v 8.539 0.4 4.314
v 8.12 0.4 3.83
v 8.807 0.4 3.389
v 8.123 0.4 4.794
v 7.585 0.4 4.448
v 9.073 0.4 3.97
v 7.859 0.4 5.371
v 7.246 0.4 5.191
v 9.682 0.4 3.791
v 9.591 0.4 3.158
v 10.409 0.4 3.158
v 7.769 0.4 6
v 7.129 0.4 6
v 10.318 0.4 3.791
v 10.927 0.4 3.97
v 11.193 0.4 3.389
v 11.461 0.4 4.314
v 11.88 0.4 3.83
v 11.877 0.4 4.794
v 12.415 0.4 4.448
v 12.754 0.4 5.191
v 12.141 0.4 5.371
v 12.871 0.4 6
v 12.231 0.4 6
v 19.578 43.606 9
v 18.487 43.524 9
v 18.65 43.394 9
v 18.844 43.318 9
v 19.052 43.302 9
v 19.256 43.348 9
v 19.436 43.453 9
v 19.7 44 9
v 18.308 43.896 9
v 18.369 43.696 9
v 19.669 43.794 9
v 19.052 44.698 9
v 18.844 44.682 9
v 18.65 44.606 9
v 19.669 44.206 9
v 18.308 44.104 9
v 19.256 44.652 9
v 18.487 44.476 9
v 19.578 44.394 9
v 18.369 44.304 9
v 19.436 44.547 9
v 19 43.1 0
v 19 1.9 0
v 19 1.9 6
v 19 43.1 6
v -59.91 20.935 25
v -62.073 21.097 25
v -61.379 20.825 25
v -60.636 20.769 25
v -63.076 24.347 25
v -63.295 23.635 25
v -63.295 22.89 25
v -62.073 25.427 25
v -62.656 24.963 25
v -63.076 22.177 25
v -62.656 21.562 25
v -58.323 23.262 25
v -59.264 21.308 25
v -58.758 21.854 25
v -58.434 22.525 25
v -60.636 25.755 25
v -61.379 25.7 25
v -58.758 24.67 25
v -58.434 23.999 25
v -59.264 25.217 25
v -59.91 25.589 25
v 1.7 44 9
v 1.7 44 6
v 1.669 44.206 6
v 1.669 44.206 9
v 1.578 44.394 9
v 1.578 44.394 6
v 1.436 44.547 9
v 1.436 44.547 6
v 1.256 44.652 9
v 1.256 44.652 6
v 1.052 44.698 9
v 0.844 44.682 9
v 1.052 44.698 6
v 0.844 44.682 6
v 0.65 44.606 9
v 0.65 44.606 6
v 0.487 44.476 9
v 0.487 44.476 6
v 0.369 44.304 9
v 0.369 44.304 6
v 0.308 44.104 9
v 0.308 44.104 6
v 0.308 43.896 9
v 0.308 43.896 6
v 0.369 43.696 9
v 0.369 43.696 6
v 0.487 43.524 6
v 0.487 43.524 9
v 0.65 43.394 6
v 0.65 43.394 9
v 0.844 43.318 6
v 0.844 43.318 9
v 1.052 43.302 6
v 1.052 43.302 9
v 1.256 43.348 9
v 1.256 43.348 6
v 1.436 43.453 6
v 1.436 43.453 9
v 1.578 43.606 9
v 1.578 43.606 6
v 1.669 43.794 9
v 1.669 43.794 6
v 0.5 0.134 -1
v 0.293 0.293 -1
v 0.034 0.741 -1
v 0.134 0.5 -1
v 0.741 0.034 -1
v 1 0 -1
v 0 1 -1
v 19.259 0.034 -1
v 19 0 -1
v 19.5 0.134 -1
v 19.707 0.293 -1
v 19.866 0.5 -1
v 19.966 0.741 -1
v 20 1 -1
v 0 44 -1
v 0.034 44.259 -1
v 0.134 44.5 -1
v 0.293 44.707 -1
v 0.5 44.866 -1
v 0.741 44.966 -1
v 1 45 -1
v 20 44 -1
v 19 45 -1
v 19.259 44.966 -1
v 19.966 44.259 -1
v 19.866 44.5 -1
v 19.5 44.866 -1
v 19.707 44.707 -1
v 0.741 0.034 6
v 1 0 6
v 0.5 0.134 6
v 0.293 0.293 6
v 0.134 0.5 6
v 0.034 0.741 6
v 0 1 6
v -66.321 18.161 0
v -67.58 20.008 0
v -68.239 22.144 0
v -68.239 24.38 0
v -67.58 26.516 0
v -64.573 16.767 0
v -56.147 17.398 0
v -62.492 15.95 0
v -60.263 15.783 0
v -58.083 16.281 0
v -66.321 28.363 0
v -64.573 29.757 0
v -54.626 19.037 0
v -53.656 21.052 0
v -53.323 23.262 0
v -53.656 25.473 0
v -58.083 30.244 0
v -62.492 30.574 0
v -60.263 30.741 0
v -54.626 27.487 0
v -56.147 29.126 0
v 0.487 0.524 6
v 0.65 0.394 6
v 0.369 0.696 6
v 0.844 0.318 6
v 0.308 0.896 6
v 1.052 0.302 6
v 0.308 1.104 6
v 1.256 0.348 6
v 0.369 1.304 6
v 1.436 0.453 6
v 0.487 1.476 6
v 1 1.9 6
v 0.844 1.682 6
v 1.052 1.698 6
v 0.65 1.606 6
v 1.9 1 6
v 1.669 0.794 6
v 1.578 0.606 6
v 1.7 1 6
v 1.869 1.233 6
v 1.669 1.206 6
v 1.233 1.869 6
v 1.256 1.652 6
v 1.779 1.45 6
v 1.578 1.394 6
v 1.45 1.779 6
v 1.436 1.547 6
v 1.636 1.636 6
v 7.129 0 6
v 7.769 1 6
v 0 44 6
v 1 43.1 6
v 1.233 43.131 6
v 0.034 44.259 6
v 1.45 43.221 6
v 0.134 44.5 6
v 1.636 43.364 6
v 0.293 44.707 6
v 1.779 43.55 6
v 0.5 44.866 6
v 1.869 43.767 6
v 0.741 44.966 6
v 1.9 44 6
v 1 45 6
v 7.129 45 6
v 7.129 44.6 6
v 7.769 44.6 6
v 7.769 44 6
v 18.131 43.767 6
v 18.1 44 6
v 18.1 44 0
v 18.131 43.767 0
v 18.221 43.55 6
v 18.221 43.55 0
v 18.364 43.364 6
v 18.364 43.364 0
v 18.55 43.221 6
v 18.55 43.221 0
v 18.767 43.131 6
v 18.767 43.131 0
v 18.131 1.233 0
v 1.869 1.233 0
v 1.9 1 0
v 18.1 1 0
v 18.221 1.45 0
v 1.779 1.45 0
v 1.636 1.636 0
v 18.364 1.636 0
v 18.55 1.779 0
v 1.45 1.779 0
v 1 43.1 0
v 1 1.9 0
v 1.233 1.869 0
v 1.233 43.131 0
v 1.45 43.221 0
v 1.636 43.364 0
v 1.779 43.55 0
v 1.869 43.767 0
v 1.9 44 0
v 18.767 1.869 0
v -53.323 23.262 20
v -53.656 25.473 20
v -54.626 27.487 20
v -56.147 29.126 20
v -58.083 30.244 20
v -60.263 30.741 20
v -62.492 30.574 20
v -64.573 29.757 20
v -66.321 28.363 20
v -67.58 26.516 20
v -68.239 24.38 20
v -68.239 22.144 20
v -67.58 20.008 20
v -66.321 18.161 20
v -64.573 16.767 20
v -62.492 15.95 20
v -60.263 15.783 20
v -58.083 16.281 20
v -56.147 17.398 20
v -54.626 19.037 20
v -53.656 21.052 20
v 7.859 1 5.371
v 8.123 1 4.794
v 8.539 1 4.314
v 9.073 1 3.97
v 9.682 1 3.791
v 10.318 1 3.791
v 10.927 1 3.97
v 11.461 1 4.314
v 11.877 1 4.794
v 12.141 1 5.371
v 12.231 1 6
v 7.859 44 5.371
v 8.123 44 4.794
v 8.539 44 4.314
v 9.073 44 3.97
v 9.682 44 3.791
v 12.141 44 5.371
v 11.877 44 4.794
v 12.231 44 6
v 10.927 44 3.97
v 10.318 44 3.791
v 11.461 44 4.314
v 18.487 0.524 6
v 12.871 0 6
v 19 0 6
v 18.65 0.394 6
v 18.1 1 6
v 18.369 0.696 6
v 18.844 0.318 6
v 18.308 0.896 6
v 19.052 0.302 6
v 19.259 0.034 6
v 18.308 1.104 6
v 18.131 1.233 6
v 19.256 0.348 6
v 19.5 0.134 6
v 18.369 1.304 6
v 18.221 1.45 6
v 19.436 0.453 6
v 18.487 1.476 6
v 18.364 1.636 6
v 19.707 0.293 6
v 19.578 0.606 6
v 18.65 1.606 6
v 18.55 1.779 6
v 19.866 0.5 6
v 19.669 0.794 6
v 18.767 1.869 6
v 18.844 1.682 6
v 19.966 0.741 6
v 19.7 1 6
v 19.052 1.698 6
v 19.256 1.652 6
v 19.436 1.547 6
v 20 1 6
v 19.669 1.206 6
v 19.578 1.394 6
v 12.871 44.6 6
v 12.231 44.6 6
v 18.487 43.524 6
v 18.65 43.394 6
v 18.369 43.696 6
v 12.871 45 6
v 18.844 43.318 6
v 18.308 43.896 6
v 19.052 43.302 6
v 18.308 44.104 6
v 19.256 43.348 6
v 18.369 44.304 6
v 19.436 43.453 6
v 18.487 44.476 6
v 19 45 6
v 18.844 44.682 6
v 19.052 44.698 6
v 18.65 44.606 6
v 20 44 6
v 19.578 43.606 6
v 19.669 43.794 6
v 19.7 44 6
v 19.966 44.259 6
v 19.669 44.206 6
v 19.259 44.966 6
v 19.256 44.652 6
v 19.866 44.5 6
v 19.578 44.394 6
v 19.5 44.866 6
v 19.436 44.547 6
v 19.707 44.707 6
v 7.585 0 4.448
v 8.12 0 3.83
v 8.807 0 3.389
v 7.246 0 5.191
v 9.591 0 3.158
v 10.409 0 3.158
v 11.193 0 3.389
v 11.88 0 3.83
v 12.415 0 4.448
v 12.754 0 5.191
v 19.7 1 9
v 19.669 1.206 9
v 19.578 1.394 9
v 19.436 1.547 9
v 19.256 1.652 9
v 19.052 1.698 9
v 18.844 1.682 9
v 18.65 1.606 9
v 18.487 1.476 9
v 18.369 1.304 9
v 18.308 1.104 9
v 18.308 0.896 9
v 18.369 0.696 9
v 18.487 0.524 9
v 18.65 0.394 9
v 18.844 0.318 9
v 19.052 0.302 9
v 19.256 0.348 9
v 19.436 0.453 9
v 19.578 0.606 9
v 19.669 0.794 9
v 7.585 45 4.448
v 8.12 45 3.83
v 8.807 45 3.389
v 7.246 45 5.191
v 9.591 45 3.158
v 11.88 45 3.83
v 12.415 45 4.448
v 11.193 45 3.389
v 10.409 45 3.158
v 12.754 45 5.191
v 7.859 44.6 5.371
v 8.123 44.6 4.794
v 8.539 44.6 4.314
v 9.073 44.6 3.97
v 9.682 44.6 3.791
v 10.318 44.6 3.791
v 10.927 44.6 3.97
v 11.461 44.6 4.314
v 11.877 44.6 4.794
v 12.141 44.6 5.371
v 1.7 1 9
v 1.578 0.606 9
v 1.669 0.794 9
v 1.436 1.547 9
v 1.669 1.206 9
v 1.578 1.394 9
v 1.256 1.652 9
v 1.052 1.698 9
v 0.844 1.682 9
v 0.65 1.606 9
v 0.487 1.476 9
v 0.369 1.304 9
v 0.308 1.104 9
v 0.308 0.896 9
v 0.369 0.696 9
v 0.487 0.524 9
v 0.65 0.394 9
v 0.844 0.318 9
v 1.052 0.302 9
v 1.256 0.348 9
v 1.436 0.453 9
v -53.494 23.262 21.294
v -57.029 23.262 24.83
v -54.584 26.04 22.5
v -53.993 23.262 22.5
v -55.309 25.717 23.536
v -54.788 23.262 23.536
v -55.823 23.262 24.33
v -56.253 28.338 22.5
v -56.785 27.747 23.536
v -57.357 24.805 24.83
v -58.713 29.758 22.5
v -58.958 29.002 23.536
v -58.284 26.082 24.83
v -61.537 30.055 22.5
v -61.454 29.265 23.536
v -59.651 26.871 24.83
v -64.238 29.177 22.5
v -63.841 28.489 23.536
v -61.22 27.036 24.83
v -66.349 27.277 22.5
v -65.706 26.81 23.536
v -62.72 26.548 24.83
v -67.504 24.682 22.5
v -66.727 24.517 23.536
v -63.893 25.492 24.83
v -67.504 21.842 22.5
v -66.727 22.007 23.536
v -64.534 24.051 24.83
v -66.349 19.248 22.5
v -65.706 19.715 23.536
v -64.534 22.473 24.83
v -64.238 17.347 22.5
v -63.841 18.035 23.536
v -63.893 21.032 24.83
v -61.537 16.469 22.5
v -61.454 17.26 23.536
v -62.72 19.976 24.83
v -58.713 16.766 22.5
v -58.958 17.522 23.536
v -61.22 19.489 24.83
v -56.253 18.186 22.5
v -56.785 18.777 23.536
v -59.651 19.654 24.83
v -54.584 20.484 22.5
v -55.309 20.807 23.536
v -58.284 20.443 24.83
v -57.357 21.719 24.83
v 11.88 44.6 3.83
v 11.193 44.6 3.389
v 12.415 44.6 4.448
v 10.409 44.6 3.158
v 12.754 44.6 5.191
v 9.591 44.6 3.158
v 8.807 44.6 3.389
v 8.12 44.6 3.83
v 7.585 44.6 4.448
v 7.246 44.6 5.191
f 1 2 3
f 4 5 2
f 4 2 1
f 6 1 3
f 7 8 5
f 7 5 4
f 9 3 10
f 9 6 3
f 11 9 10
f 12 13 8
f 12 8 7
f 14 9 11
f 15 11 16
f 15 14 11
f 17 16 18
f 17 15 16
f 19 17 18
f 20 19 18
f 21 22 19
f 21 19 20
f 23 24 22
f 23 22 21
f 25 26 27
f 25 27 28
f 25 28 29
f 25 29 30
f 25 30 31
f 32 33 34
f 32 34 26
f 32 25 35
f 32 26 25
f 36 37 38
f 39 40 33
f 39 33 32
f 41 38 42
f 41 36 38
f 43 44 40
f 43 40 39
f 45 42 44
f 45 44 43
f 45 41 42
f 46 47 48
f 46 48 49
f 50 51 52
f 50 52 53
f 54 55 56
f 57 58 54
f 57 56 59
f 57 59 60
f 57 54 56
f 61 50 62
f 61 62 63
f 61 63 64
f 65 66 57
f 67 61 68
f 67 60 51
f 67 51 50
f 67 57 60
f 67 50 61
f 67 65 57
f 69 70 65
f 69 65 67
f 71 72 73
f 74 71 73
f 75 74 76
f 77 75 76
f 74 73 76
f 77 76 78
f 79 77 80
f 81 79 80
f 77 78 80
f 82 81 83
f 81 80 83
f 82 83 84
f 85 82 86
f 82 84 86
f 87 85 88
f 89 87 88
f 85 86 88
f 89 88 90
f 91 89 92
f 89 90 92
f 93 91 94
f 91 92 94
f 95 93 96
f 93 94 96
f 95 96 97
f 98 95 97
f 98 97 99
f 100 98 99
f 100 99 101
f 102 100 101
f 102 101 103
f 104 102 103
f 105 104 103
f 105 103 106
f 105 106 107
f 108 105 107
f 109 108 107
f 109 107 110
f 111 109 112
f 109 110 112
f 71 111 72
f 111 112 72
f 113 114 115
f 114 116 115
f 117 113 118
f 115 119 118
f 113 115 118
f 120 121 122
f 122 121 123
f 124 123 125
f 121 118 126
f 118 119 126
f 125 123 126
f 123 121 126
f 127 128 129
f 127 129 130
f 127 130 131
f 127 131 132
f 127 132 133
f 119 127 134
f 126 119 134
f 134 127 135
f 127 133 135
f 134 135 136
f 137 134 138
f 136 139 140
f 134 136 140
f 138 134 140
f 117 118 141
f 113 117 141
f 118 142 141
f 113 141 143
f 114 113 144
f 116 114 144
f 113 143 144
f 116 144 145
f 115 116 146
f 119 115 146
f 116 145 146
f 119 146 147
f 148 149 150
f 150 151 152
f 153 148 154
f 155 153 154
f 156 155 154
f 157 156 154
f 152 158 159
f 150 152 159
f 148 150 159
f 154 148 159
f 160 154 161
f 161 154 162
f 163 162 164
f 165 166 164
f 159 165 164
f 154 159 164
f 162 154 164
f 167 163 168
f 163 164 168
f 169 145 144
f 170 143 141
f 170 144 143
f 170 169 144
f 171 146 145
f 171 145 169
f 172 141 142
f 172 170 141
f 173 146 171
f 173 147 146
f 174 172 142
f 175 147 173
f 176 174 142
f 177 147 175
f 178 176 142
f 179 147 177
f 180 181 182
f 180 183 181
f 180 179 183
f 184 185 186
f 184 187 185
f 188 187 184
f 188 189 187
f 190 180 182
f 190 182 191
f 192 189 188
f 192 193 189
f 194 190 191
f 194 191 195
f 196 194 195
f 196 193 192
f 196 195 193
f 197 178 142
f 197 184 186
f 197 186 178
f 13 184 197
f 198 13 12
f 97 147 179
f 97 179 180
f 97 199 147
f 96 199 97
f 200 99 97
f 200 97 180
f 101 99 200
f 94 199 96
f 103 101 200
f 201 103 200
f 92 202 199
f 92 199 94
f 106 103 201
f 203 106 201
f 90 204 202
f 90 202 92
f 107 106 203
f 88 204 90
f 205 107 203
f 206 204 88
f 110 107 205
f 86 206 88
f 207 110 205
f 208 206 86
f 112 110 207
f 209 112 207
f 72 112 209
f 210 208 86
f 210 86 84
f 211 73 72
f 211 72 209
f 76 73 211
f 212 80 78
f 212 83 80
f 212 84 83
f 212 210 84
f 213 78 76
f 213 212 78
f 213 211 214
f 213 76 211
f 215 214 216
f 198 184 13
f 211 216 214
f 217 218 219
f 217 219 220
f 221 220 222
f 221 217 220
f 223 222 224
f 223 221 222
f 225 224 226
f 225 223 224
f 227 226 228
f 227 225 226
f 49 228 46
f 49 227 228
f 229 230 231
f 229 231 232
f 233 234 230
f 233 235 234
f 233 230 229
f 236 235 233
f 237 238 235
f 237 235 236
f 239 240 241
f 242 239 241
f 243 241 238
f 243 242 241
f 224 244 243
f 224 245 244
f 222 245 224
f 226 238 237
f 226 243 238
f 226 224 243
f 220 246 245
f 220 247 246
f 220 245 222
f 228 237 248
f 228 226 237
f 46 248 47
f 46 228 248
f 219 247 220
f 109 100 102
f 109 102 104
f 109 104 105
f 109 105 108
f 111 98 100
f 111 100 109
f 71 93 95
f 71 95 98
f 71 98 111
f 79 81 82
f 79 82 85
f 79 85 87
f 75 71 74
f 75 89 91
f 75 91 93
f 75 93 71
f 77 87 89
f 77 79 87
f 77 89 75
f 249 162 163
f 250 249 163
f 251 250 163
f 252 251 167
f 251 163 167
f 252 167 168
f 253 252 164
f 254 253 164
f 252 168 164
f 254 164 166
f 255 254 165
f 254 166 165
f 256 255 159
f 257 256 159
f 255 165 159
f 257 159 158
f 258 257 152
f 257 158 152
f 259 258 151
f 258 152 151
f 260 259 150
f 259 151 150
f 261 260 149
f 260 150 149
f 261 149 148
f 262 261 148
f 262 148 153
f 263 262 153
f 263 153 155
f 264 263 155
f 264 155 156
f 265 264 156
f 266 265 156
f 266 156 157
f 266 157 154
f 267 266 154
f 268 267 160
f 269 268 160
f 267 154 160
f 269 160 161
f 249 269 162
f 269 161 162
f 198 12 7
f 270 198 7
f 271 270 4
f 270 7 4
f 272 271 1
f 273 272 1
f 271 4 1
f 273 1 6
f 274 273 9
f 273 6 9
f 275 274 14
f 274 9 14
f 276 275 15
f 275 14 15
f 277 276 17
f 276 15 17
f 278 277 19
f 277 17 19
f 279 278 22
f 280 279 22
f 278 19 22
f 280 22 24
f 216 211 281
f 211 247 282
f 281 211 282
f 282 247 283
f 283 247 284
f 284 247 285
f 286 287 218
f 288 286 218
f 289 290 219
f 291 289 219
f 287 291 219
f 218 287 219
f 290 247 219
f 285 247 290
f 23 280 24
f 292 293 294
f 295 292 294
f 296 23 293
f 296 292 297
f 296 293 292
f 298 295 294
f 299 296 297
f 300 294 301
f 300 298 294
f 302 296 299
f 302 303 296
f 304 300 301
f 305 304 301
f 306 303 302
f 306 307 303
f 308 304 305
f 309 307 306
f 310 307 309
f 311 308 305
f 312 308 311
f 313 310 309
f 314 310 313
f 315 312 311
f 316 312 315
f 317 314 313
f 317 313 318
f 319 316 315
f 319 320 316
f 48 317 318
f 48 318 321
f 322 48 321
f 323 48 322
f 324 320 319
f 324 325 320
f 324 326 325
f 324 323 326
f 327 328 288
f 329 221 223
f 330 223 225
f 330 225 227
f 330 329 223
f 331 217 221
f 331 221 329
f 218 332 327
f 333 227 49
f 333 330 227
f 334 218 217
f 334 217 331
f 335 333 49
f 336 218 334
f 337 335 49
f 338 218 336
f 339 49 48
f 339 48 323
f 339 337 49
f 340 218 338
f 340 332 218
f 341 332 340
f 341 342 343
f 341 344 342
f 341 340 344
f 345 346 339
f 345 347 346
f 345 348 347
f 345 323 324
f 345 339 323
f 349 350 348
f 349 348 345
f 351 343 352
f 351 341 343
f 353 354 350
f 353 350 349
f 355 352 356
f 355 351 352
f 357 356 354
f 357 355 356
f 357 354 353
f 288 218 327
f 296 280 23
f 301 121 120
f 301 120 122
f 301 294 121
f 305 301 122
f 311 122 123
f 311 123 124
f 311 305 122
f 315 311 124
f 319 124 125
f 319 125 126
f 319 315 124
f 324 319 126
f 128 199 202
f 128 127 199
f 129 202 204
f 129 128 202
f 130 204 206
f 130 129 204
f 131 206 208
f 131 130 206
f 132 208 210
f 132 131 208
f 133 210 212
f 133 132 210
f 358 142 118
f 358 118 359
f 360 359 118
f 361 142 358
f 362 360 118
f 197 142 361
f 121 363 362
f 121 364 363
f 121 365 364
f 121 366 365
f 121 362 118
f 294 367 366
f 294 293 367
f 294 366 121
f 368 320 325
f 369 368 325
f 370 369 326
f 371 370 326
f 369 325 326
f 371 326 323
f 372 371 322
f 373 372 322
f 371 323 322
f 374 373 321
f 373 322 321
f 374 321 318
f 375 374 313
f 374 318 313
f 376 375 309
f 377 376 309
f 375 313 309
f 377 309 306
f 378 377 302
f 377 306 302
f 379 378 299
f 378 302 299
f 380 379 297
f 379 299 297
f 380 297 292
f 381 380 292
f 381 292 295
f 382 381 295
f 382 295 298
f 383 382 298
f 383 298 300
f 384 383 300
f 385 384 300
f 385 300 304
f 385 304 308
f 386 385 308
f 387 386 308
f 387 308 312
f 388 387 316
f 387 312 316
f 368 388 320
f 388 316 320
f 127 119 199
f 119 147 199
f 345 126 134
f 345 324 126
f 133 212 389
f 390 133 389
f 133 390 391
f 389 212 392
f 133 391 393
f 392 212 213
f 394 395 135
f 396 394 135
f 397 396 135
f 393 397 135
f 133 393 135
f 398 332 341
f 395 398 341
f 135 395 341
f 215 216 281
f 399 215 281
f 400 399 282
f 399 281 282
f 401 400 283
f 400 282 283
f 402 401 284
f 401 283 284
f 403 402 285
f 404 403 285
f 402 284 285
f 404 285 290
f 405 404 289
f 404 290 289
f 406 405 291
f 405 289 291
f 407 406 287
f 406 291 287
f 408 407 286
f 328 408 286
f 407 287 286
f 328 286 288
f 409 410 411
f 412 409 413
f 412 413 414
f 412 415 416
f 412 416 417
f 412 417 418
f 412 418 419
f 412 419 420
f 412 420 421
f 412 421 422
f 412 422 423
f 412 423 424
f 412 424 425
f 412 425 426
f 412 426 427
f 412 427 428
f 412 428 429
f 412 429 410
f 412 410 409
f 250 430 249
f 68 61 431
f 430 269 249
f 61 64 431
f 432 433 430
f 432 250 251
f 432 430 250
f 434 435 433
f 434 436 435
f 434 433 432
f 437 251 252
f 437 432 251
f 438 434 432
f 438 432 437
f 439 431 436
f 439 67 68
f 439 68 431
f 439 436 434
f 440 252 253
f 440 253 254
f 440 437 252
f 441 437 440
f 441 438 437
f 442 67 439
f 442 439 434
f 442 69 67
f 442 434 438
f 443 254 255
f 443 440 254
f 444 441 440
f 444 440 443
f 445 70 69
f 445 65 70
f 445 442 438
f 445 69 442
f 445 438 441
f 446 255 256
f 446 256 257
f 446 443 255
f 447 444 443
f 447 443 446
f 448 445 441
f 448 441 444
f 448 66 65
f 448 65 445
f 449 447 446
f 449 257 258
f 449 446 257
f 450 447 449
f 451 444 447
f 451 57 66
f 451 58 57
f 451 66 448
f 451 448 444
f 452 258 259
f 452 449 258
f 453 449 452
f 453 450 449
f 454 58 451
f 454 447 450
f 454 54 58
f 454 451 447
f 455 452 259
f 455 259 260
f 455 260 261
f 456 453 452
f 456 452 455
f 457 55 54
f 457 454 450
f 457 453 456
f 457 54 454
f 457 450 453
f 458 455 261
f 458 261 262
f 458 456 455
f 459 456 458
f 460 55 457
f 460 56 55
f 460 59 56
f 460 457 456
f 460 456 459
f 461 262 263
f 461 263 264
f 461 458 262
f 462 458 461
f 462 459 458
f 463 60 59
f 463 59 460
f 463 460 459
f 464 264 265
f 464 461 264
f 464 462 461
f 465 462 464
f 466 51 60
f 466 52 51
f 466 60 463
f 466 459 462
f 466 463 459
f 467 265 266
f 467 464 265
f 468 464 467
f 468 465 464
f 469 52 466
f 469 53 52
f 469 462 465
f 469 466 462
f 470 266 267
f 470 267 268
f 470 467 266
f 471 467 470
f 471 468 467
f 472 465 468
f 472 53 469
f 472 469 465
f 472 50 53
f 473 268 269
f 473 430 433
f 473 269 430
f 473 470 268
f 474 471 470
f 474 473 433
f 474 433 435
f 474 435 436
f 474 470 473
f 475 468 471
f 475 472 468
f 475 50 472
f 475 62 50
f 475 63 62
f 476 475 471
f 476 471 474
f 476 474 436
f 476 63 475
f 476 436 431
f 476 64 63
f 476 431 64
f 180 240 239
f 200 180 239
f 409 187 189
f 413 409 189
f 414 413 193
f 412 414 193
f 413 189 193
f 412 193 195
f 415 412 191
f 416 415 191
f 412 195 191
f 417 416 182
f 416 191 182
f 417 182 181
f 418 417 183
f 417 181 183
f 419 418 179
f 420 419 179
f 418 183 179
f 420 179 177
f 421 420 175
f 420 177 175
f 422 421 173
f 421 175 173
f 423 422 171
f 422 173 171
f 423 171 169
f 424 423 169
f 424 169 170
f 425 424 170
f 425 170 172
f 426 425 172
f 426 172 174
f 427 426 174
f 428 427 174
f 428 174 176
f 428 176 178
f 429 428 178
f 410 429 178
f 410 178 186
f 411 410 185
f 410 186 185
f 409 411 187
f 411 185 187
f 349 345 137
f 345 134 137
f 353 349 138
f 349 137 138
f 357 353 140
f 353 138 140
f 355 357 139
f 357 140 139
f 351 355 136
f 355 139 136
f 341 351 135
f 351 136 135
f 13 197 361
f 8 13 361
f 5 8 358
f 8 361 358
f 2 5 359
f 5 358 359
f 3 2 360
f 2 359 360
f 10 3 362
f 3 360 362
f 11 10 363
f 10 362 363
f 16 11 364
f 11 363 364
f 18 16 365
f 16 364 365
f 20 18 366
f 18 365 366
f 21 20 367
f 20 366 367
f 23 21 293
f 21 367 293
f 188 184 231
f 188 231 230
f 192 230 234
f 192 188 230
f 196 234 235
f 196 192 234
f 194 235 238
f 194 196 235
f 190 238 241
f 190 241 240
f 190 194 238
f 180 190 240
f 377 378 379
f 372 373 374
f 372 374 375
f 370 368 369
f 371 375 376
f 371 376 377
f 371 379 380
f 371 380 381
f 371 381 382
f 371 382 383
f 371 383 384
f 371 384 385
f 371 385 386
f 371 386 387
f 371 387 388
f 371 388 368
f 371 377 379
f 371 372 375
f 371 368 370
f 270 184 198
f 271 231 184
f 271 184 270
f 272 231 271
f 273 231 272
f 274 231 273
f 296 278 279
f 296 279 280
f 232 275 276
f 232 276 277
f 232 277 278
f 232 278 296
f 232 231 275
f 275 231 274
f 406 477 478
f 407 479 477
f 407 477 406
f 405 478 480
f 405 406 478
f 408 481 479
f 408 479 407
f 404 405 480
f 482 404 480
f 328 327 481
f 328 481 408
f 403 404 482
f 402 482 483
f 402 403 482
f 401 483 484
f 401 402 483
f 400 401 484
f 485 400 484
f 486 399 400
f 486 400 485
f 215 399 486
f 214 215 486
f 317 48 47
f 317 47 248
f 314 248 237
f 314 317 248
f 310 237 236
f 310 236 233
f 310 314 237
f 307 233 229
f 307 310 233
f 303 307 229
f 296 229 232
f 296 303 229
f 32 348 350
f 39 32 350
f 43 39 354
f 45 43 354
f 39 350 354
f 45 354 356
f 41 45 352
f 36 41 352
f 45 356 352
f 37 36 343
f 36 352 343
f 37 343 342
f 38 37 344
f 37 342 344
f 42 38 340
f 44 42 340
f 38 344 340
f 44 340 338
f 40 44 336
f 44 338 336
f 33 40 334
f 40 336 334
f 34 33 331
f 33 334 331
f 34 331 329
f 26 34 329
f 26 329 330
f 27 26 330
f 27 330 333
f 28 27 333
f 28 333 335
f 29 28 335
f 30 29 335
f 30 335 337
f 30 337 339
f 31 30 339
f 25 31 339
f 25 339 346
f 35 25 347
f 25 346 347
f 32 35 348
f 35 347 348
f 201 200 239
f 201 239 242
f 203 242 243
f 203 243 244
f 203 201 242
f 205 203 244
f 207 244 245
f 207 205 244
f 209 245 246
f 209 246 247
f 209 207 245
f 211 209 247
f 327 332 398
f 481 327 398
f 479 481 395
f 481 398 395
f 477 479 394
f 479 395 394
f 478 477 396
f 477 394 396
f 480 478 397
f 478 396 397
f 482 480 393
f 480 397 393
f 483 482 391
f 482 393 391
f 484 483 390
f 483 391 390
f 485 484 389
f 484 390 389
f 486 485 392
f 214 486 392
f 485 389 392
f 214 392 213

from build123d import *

# Parameters (mm, degrees)
F0_W      = 20
F0_H      = 45
F0_W_2    = 18
F0_H_2    = 43
F1_DEPTH  = 6
F2_W      = 20
F2_H      = 45
F3_DEPTH  = 1
F5_DEPTH  = 6
F6_R      = 0.7
F7_DEPTH  = 3
F8_R      = 1
F9_R      = 1
F10_R     = 1
F13_DEPTH = 45.001
F14_DEPTH = 0.4
F15_DEPTH = 0.4
F16_R     = 7.5
F17_DEPTH = 25
F18_R     = 5


with BuildPart() as f1:
    # F0 (on Top) → F1 (new body)
    with BuildSketch(Plane.XY):
        with Locations((10, 22.5)):
            Rectangle(F0_W, F0_H)
        with Locations((10, 22.5)):
            Rectangle(F0_W_2, F0_H_2, mode=Mode.SUBTRACT)
    extrude(amount=F1_DEPTH)

    # F2 (on Top) → F3 (join)
    with BuildSketch(Plane.XY):
        with Locations((10, 22.5)):
            Rectangle(F2_W, F2_H)
    extrude(amount=-F3_DEPTH)

    # F4 (on face) → F5 (join)
    with BuildSketch(Plane.XY.offset(6)):
        with BuildLine():
            Line((19, 44), (19, 43.1))
            ThreePointArc((19, 43.1), (19.6363961031, 43.3636038969), (19.9, 44))
            ThreePointArc((19.9, 44), (19, 44.9), (18.1, 44))
            Line((18.1, 44), (19, 44))
        make_face()
        with BuildLine():
            Line((19, 1), (19, 1.9))
            ThreePointArc((19, 1.9), (18.3636038969, 1.6363961031), (18.1, 1))
            Line((18.1, 1), (19, 1))
        make_face()
        with BuildLine():
            ThreePointArc((18.1, 1), (19, 0.1), (19.9, 1))
            ThreePointArc((19.9, 1), (19.6363961031, 1.6363961031), (19, 1.9))
            Line((19, 1.9), (19, 1))
            Line((19, 1), (18.1, 1))
        make_face()
        with BuildLine():
            Line((1, 1), (1.9, 1))
            ThreePointArc((1.9, 1), (1.6363961031, 1.6363961031), (1, 1.9))
            Line((1, 1.9), (1, 1))
        make_face()
        with BuildLine():
            ThreePointArc((1, 43.1), (1.6363961031, 43.3636038969), (1.9, 44))
            Line((1.9, 44), (1, 44))
            Line((1, 44), (1, 43.1))
        make_face()
        with BuildLine():
            ThreePointArc((18.1, 44), (18.3636038969, 43.3636038969), (19, 43.1))
            Line((19, 43.1), (19, 44))
            Line((19, 44), (18.1, 44))
        make_face()
    extrude(amount=-F5_DEPTH)

    # F6 (on face) → F7 (join)
    with BuildSketch(Plane.XY.offset(6)):
        with Locations((1, 1)):
            Circle(F6_R)
        with Locations((19, 1)):
            Circle(F6_R)
        with Locations((1, 44)):
            Circle(F6_R)
        with Locations((19, 44)):
            Circle(F6_R)
    extrude(amount=F7_DEPTH)

    # F8
    f8_edges = [f1.edges().sort_by_distance(p)[0] for p in [
        (20, 0, 2.5),
    ]]
    fillet(f8_edges, radius=F8_R)

    # F9
    f9_edges = [f1.edges().sort_by_distance(p)[0] for p in [
        (0, 0, 2.5),
    ]]
    fillet(f9_edges, radius=F9_R)

    # F10
    f10_edges = [f1.edges().sort_by_distance(p)[0] for p in [
        (0, 45, 2.5),
        (20, 45, 2.5),
    ]]
    fillet(f10_edges, radius=F10_R)

    # F11 (on face) → F13 (cut, through all)
    with BuildSketch(Plane.XZ):
        with BuildLine():
            ThreePointArc((7.7686794017, 6), (10, 3.7686794017), (12.2313205983, 6))
            Line((12.2313205983, 6), (7.7686794017, 6))
        make_face()
    extrude(amount=-F13_DEPTH, mode=Mode.SUBTRACT)

    # F11 (on face) → F14 (cut)
    with BuildSketch(Plane.XZ):
        with BuildLine():
            ThreePointArc((7.1292357253, 6), (10, 3.1292357253), (12.8707642747, 6))
            Line((12.8707642747, 6), (12.2313205983, 6))
            ThreePointArc((12.2313205983, 6), (10, 3.7686794017), (7.7686794017, 6))
            Line((7.7686794017, 6), (7.1292357253, 6))
        make_face()
    extrude(amount=-F14_DEPTH, mode=Mode.SUBTRACT)

    # F12 (on face) → F15 (cut)
    with BuildSketch(Plane(origin=(0, 45, 0), x_dir=(-1, 0, 0), z_dir=(0, 1, 0))):
        with BuildLine():
            Line((-7.1292357253, 6), (-7.7686794017, 6))
            ThreePointArc((-7.7686794017, 6), (-10, 3.7686794017), (-12.2313205983, 6))
            Line((-12.2313205983, 6), (-12.8707642747, 6))
            ThreePointArc((-12.8707642747, 6), (-10, 3.1292357253), (-7.1292357253, 6))
        make_face()
    extrude(amount=-F15_DEPTH, mode=Mode.SUBTRACT)


with BuildPart() as f17:
    # F16 (on Top) → F17 (new body)
    with BuildSketch(Plane.XY):
        with Locations((-60.8231723309, 23.2621971518)):
            Circle(F16_R)
    extrude(amount=F17_DEPTH)

    # F18
    f18_edges = [f17.edges().sort_by_distance(p)[0] for p in [
        (-68.323172, 23.262197, 25),
    ]]
    fillet(f18_edges, radius=F18_R)


solid = Compound([f1.part, f17.part])
